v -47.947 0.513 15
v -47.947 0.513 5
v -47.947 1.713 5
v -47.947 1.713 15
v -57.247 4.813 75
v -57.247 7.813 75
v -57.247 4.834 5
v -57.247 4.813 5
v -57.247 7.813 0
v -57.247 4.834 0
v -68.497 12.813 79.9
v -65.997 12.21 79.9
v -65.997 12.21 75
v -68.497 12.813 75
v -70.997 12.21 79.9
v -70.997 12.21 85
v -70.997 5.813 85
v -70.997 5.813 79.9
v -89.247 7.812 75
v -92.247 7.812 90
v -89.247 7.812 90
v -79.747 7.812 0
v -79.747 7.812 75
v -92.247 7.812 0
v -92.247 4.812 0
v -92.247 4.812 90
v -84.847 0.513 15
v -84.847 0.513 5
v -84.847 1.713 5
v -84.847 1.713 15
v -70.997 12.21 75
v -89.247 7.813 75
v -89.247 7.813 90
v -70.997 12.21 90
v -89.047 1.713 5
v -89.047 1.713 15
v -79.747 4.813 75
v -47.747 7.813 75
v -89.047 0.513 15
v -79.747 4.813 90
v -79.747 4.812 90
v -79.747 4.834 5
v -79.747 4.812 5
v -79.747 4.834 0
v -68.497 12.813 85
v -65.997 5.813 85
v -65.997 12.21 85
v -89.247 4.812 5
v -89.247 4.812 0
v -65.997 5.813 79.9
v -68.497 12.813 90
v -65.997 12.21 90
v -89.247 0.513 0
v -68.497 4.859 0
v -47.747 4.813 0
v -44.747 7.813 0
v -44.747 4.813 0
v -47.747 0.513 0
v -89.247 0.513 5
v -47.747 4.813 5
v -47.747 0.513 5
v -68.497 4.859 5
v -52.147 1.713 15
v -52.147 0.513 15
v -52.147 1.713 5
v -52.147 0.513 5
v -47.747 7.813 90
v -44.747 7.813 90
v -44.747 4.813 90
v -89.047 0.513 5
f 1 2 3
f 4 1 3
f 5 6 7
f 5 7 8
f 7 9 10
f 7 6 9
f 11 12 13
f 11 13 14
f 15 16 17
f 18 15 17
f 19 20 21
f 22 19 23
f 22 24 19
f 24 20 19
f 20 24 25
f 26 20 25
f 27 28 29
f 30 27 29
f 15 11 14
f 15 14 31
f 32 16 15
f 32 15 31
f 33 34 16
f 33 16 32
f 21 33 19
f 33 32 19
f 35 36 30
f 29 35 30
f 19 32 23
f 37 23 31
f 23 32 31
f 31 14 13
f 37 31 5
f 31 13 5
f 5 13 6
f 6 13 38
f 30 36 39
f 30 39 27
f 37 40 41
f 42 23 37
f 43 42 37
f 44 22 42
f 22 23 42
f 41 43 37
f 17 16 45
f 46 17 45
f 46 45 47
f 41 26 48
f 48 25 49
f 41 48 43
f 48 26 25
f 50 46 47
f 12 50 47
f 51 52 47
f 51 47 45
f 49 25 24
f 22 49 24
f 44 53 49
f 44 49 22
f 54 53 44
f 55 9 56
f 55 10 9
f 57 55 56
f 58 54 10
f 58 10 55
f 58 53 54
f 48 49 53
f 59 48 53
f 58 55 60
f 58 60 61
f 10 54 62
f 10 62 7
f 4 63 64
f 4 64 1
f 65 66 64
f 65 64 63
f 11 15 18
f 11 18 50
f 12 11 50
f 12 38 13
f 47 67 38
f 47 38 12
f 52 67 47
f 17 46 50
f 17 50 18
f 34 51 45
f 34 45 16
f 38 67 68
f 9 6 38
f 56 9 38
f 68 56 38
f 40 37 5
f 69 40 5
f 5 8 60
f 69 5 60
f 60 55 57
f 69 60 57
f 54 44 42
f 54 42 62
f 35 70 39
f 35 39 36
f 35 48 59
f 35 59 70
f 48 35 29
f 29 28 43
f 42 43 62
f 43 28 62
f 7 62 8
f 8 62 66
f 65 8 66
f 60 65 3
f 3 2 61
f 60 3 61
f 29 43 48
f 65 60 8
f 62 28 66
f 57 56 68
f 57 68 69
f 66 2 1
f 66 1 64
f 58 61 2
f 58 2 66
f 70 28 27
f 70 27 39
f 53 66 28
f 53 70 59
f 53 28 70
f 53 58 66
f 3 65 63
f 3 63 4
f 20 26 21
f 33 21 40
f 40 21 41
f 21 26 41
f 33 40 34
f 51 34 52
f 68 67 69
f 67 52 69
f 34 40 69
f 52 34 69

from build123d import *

# Parameters (mm, degrees)
F0_W      = 4.2
F0_H      = 1.2
F1_DEPTH  = 15
F0_W_2    = 32.7
F2_DEPTH  = 5
F4_DEPTH  = 5
F6_DEPTH  = 5
F7_W      = 9.5
F7_H      = 3
F8_DEPTH  = 90
F9_W      = 9.5
F9_H      = 3
F10_DEPTH = 15
F11_DEPTH = 10.1
F12_DEPTH = 5
F13_W     = 5
F13_H     = 5.1
F14_DEPTH = 4.5
F15_W     = 3
F15_H     = 3
F16_DEPTH = 90


with BuildPart() as f1:
    # F0 (on Top) → F1 (new body)
    with BuildSketch(Plane.XY):
        with Locations((-86.9470929563, 1.1125010281)):
            Rectangle(F0_W, F0_H)
    extrude(amount=F1_DEPTH)



with BuildPart() as f1b:
    # F0 (on Top) → F1, piece 2 (new body)
    with BuildSketch(Plane.XY):
        with Locations((-50.0470929563, 1.1125010281)):
            Rectangle(F0_W, F0_H)
    extrude(amount=F1_DEPTH)


with BuildPart() as f1_1:
    add(f1.part)

    add(f1b.part)  # F2 merges F1b
    # F0 (on Top) → F2 (join)
    with BuildSketch(Plane.XY):
        with Locations((-68.4970929563, 1.1125010281)):
            Rectangle(F0_W_2, F0_H)
    extrude(amount=F2_DEPTH)

    # F3 (on face) → F4 (join)
    with BuildSketch(Plane(origin=(0, 0, 0), x_dir=(1, 0, 0), z_dir=(0, 0, -1))):
        Polygon((-52.1470929563, -0.5125010281), (-84.8470929563, -0.5125010281), (-89.2470929563, -0.5125010281), (-89.2470929563, -4.8120530977), (-68.4970929563, -4.8593617954), (-47.7470929563, -4.8125010281), (-47.7470929563, -0.5125010281), align=None)
    extrude(amount=-F4_DEPTH)

    # F5: union 

    # F3 (on face) → F6 (join)
    with BuildSketch(Plane(origin=(0, 0, 0), x_dir=(1, 0, 0), z_dir=(0, 0, -1))):
        Polygon((-52.1470929563, -0.5125010281), (-84.8470929563, -0.5125010281), (-89.2470929563, -0.5125010281), (-89.2470929563, -4.8120530977), (-68.4970929563, -4.8593617954), (-47.7470929563, -4.8125010281), (-47.7470929563, -0.5125010281), align=None)
    extrude(amount=-F6_DEPTH)

    # F7 (on face) → F8 (join)
    with BuildSketch(Plane(origin=(0, 0, 0), x_dir=(1, 0, 0), z_dir=(0, 0, -1))):
        with Locations((-84.4970929563, -6.3120530977)):
            Rectangle(F7_W, F7_H)
        with Locations((-52.4970929563, -6.3125010281)):
            Rectangle(F7_W, F7_H)
    extrude(amount=-F8_DEPTH)

    # F9 (on face) → F10 (join)
    with BuildSketch(Plane.XY.offset(90)):
        Polygon((-89.2470929563, 4.8125010281), (-57.2470929563, 4.8125010281), (-57.2470929563, 7.8125010281), (-68.4970929563, 7.8125010281), (-89.2470929563, 7.8125010281), align=None)
        with Locations((-52.4970929563, 6.3125010281)):
            Rectangle(F9_W, F9_H)
        Polygon((-57.2470929563, 7.8125010281), (-47.7470929563, 7.8125010281), (-65.9970929563, 12.2100913895), (-65.9970929563, 10.3125010281), (-68.4970929563, 10.3125010281), (-68.4970929563, 7.8125010281), align=None)
        Polygon((-70.9970929563, 12.2100913895), (-89.2470929563, 7.8125010281), (-68.4970929563, 7.8125010281), (-68.4970929563, 10.3125010281), (-70.9970929563, 10.3125010281), align=None)
        Polygon((-68.4970929563, 10.3125010281), (-68.4970929563, 12.8125010281), (-70.9970929563, 12.2100913895), (-70.9970929563, 10.3125010281), align=None)
        Polygon((-65.9970929563, 10.3125010281), (-65.9970929563, 12.2100913895), (-68.4970929563, 12.8125010281), (-68.4970929563, 10.3125010281), align=None)
    extrude(amount=-F10_DEPTH)

    # F9 (on face) → F11 (cut)
    with BuildSketch(Plane.XY.offset(90)):
        Polygon((-68.4970929563, 10.3125010281), (-68.4970929563, 12.8125010281), (-70.9970929563, 12.2100913895), (-70.9970929563, 10.3125010281), align=None)
        Polygon((-65.9970929563, 10.3125010281), (-65.9970929563, 12.2100913895), (-68.4970929563, 12.8125010281), (-68.4970929563, 10.3125010281), align=None)
    extrude(amount=-F11_DEPTH, mode=Mode.SUBTRACT)

    # F9 (on face) → F12 (join)
    with BuildSketch(Plane.XY.offset(90)):
        Polygon((-65.9970929563, 10.3125010281), (-65.9970929563, 12.2100913895), (-68.4970929563, 12.8125010281), (-68.4970929563, 10.3125010281), align=None)
        Polygon((-68.4970929563, 10.3125010281), (-68.4970929563, 12.8125010281), (-70.9970929563, 12.2100913895), (-70.9970929563, 10.3125010281), align=None)
    extrude(amount=-F12_DEPTH)

    # F13 (on face) → F14 (cut)
    with BuildSketch(Plane(origin=(0, 10.3125010281, 0), x_dir=(-1, 0, 0), z_dir=(0, 1, 0))):
        with Locations((68.4970929563, 82.45)):
            Rectangle(F13_W, F13_H)
    extrude(amount=-F14_DEPTH, mode=Mode.SUBTRACT)

    # F15 (on face) → F16 (join)
    with BuildSketch(Plane(origin=(0, 0, 0), x_dir=(1, 0, 0), z_dir=(0, 0, -1))):
        with Locations((-46.2470929563, -6.3125010281)):
            Rectangle(F15_W, F15_H)
        with Locations((-90.7470929563, -6.3120530977)):
            Rectangle(F15_W, F15_H)
    extrude(amount=-F16_DEPTH)


solid = f1_1.part
